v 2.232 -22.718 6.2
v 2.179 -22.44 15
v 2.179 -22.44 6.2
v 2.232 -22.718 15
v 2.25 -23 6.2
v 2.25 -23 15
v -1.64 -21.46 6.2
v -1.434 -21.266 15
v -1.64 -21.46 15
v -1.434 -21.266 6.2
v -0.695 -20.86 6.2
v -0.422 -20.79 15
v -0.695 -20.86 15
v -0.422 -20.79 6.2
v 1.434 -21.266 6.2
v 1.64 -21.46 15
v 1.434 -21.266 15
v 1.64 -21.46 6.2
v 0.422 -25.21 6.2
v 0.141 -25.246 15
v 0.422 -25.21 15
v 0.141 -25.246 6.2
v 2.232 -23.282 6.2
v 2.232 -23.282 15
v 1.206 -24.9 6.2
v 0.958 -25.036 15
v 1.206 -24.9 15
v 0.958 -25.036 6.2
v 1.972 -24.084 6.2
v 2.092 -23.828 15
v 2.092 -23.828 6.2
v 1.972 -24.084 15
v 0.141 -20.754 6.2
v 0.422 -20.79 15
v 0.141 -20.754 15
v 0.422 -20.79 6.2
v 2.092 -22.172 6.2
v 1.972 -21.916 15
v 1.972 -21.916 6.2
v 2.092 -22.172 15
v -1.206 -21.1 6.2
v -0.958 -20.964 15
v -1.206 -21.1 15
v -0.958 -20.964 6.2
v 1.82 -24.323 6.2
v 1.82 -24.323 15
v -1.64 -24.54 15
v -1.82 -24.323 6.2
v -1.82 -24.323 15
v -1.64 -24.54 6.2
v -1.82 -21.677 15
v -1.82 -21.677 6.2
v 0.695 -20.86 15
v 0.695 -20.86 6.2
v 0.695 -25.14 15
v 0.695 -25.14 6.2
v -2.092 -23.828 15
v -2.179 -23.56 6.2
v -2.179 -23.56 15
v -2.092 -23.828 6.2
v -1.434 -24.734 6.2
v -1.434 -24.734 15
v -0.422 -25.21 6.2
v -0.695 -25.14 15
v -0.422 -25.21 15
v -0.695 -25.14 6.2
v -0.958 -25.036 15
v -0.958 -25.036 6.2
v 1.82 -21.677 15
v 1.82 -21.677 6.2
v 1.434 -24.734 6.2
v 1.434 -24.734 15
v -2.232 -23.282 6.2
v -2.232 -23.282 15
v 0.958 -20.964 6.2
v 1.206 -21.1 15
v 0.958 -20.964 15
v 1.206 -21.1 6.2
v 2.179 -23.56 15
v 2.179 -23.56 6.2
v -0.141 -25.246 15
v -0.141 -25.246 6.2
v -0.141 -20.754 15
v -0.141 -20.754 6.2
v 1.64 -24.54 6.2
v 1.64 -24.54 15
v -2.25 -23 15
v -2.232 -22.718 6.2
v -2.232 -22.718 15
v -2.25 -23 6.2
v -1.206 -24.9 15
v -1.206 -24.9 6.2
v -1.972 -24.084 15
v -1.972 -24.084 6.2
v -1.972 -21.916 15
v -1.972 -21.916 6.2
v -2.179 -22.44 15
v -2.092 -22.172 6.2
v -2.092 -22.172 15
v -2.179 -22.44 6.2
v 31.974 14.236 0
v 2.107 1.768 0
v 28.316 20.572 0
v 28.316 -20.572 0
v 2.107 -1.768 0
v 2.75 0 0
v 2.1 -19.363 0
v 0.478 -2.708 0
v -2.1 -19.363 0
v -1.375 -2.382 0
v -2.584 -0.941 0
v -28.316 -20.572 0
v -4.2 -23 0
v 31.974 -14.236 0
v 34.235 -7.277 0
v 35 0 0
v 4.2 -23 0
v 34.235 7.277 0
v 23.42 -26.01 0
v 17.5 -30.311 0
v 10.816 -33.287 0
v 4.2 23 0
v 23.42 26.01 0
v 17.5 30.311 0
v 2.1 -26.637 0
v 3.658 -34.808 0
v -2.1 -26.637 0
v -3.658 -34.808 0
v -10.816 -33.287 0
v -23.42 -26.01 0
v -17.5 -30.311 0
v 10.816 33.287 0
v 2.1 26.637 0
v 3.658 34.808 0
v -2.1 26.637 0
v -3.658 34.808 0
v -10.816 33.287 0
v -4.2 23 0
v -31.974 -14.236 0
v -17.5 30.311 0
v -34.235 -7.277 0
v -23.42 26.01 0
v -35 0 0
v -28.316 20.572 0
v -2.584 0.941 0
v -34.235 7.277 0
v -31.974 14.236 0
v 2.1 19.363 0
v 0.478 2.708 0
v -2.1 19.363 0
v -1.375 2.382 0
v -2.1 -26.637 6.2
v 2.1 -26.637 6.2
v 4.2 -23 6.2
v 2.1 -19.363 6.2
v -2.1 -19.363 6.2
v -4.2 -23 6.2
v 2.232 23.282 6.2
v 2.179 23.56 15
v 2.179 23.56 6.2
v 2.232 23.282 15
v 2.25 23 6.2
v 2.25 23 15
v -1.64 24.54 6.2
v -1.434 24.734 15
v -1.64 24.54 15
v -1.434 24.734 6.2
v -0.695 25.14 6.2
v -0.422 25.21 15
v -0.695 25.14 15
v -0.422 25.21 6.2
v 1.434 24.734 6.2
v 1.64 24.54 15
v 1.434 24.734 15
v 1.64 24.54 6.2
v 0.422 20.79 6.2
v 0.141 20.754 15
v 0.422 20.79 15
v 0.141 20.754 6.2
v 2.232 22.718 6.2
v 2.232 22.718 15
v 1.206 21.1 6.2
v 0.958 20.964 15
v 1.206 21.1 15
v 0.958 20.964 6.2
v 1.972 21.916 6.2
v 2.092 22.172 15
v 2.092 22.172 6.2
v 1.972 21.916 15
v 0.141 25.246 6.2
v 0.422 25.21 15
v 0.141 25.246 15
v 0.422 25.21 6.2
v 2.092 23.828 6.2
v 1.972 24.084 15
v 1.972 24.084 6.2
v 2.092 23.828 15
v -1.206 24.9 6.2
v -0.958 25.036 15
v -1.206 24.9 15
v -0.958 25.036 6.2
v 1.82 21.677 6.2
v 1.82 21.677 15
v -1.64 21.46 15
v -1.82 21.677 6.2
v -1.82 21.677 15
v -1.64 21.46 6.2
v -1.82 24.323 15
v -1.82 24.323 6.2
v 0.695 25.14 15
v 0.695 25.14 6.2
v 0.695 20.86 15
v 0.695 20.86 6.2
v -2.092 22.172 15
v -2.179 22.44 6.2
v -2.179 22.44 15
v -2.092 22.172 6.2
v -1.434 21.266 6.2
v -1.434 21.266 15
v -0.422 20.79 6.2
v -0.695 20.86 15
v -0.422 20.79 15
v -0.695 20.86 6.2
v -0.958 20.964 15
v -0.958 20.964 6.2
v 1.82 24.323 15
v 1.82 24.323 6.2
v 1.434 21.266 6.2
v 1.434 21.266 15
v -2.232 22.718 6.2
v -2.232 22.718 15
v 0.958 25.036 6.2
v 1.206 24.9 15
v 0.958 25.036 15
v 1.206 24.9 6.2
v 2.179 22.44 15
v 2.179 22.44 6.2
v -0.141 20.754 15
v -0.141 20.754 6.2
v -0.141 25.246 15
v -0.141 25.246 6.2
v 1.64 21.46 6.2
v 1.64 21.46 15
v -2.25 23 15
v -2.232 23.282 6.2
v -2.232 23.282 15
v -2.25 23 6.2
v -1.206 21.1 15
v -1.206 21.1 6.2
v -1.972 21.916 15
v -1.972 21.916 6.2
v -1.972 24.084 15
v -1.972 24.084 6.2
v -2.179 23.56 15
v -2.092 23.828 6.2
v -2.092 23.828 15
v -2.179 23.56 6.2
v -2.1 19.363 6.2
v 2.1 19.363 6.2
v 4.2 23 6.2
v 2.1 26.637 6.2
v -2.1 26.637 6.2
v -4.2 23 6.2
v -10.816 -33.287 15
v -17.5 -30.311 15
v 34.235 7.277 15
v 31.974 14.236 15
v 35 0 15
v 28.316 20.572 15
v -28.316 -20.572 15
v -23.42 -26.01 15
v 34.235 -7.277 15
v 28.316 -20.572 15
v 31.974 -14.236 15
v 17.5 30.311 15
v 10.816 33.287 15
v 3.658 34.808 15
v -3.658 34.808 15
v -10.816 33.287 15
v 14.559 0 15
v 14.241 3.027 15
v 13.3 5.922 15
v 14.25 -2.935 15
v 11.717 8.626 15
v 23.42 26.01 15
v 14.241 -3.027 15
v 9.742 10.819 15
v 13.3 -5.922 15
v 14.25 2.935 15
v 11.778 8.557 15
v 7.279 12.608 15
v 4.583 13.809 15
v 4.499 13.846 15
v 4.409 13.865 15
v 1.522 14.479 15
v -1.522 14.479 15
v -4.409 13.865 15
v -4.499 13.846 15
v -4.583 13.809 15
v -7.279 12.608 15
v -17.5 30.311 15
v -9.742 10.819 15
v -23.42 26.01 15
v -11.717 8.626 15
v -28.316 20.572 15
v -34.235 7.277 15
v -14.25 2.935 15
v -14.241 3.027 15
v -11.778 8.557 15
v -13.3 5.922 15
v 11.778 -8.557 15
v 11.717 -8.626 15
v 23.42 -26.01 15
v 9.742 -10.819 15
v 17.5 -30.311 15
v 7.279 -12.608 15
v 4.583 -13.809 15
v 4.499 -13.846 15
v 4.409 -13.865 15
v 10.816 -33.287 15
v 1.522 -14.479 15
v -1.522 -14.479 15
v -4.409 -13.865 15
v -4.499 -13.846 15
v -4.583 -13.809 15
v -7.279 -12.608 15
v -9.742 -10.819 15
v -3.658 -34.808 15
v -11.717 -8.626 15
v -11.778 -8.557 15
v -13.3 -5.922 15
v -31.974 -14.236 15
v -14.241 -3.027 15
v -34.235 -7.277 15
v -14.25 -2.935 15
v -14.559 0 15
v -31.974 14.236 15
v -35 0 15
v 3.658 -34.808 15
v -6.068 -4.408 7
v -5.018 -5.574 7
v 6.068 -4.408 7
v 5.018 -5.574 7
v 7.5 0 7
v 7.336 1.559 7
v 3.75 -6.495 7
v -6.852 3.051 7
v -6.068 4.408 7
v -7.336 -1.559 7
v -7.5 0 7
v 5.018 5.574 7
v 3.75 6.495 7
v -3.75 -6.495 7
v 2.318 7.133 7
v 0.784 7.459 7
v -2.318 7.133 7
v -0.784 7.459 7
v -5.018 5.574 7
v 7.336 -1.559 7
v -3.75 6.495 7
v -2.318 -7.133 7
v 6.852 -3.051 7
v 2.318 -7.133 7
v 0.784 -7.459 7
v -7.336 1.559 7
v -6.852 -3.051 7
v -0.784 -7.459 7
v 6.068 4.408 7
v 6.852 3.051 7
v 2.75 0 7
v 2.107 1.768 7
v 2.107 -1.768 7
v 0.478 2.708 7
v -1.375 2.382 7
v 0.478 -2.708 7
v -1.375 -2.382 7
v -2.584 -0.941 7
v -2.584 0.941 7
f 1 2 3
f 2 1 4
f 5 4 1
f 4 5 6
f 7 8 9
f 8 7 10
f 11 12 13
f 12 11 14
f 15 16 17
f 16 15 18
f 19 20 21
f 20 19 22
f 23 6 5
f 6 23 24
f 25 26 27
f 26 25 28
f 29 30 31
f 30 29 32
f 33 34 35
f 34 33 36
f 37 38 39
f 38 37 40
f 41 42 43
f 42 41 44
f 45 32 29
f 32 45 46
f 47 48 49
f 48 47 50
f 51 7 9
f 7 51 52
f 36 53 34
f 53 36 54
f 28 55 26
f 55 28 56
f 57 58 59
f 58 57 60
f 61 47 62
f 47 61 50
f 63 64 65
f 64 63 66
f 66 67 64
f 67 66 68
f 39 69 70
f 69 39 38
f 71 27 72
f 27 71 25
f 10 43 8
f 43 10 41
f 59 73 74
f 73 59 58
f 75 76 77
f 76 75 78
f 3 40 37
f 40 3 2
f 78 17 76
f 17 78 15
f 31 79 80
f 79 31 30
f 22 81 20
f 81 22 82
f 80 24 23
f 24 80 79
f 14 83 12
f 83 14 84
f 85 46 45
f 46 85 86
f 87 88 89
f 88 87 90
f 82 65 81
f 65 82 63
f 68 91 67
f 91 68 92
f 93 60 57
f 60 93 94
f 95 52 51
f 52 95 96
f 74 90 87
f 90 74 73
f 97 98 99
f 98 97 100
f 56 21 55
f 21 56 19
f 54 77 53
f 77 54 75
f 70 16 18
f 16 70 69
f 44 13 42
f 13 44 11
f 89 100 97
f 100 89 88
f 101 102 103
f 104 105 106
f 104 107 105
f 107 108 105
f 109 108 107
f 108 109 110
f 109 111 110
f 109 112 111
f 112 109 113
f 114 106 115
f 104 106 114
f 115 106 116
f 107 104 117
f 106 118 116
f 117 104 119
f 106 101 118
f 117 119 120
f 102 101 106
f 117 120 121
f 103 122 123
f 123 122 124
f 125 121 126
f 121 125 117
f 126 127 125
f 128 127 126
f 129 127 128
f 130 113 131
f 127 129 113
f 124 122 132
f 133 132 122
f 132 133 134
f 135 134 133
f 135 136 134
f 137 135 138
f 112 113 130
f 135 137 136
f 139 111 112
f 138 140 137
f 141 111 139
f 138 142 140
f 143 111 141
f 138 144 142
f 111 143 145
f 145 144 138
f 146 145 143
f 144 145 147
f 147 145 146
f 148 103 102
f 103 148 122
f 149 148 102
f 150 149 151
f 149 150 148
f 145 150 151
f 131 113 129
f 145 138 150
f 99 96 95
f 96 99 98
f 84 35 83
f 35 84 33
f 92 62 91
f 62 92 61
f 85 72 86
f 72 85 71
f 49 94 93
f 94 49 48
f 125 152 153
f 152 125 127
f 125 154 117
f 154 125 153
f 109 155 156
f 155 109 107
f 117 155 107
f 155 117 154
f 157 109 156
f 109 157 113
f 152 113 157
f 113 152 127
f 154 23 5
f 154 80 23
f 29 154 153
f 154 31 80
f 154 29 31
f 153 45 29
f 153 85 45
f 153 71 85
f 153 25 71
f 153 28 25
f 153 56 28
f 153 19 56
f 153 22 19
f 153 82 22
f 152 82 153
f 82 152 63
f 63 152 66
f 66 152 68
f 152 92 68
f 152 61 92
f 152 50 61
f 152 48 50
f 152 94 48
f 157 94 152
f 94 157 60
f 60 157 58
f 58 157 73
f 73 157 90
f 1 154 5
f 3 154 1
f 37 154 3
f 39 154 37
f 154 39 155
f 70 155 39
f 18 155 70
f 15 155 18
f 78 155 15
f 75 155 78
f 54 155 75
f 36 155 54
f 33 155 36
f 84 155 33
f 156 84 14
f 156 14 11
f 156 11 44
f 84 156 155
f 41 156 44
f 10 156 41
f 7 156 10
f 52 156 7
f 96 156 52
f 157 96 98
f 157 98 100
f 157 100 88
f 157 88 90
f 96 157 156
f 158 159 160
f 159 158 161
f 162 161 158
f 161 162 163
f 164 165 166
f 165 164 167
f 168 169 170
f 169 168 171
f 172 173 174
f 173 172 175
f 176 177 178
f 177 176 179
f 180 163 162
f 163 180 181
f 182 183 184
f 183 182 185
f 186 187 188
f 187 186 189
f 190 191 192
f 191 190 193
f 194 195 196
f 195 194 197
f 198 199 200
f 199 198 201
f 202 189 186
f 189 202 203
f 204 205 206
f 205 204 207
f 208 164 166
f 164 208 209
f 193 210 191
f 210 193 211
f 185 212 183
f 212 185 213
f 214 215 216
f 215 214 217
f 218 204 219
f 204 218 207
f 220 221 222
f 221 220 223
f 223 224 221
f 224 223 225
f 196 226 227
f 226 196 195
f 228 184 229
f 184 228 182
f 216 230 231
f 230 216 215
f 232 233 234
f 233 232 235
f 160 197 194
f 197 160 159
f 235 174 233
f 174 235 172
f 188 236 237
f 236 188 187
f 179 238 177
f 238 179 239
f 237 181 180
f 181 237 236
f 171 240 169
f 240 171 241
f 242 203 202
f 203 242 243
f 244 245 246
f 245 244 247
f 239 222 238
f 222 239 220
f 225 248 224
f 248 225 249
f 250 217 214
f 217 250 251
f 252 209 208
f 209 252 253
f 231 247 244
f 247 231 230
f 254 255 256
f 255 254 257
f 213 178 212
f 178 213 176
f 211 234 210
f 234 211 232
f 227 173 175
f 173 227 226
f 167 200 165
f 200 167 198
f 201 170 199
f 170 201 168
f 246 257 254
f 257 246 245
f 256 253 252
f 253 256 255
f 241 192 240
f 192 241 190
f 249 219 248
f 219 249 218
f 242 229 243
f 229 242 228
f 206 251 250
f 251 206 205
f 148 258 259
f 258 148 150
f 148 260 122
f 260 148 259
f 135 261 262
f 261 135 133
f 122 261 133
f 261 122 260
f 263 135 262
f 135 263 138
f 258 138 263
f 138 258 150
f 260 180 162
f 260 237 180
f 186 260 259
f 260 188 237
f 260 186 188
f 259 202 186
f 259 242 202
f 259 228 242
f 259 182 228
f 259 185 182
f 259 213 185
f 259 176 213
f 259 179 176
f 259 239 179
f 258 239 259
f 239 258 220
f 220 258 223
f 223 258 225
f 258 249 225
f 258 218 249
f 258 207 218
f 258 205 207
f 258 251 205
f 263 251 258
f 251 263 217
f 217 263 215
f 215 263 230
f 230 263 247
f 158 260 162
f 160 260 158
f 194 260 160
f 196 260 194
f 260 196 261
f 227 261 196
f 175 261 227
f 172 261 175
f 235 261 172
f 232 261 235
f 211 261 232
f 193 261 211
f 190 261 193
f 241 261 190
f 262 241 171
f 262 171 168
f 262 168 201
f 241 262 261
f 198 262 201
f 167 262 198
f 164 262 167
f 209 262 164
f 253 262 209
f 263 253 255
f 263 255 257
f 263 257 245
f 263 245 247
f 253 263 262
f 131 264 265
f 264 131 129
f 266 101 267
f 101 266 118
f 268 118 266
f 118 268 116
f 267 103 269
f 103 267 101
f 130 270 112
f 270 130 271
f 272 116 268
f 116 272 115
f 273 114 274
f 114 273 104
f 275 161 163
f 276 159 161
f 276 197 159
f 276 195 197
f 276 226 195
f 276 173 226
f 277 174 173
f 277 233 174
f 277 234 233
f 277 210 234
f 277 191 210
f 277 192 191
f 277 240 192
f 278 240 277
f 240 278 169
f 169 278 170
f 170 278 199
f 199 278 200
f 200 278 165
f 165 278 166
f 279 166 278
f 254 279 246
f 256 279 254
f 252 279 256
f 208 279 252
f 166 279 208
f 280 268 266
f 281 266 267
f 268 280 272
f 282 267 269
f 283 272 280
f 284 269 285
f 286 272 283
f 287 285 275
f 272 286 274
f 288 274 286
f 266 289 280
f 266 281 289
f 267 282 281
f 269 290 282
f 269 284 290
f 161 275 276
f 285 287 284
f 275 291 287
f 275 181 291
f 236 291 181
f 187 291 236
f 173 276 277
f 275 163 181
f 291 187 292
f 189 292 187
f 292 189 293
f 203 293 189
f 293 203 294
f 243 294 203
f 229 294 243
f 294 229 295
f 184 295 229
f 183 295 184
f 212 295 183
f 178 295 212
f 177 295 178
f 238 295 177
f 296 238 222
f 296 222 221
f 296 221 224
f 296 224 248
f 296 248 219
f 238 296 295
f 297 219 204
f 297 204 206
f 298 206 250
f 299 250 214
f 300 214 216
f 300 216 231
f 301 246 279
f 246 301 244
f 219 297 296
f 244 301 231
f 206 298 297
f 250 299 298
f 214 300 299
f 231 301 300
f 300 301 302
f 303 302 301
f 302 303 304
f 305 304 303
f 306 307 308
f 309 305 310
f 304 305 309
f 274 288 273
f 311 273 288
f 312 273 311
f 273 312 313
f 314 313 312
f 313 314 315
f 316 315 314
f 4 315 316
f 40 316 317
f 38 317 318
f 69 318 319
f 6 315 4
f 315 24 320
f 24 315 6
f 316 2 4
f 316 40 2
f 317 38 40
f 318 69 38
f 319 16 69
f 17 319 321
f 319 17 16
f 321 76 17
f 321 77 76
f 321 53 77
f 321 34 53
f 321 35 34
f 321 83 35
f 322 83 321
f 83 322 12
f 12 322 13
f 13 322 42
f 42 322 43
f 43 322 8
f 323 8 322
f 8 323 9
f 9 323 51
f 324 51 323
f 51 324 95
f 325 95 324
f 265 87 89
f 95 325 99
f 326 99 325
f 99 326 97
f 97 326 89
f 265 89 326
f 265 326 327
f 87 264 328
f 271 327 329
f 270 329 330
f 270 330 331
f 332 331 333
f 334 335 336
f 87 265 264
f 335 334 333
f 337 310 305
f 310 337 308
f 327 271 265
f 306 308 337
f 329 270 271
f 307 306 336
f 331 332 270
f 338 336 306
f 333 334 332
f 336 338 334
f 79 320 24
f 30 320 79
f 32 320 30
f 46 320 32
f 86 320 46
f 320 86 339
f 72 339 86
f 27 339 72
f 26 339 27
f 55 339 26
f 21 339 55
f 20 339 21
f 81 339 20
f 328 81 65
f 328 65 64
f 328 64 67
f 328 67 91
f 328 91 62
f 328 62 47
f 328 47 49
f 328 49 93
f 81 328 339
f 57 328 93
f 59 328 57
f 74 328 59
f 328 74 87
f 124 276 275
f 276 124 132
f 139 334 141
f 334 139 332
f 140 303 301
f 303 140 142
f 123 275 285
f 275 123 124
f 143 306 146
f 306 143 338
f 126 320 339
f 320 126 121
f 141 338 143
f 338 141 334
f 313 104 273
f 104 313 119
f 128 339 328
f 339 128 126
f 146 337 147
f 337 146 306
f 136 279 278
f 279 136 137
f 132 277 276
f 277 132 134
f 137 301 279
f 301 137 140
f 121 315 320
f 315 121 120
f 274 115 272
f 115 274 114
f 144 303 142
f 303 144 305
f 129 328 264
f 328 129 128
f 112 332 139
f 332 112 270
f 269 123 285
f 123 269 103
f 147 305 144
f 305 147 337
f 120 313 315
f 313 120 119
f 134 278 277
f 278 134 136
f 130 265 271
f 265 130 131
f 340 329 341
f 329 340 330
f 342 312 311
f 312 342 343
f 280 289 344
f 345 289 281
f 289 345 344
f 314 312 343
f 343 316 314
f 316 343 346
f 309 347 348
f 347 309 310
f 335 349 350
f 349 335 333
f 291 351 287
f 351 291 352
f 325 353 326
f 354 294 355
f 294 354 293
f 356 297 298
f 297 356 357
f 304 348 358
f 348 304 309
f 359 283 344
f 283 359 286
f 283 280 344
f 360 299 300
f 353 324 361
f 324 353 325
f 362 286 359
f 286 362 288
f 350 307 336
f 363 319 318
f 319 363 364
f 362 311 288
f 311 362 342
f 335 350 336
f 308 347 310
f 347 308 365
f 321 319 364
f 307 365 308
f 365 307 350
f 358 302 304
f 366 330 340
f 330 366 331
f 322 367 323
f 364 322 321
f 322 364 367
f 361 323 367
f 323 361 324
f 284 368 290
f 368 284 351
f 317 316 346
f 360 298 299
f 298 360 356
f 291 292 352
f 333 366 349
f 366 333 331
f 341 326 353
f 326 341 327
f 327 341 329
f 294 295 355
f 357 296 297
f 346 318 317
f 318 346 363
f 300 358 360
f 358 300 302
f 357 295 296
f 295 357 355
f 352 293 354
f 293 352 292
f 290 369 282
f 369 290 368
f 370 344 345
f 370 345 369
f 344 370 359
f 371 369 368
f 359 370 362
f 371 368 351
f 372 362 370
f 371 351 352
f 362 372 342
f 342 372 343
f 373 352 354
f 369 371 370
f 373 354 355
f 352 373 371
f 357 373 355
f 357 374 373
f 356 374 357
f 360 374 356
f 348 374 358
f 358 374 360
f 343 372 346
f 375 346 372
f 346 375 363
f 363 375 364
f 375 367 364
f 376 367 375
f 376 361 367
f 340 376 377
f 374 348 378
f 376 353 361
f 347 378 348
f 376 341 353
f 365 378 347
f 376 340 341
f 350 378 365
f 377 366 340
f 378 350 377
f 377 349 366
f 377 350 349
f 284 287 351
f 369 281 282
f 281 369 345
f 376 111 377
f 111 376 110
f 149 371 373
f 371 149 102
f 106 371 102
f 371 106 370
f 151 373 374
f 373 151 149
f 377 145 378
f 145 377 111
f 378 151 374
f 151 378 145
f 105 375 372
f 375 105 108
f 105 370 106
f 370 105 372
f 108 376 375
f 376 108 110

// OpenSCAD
include <../Parameters.scad>


module 888_3010(draft = true){
    translate([0, 0, 0]) difference(){
       cylinder(d=70, h=15);
    
        translate([0, -46/2, 0]){
            cylinder(d= M4_screw_diameter, h=20, $fn=draft?50:100);
            cylinder(d= M4_nut_diameter, h=M4_nut_height+3, $fn=6);
        }
        translate([0,  46/2, 0]){
            cylinder(d= M4_screw_diameter, h=20, $fn=draft?50:100);
            cylinder(d= M4_nut_diameter, h=M4_nut_height+3, $fn=6);
        }

        translate([0,0,7]){
        	cylinder(h=15-6.5, d1=15, d2=30);
        }
        //translate([0,0,4]){
        //	cylinder(h=20, d=M5_nut_diameter, $fn=6);
        //}
        translate([0,0,-0.1]){
        	cylinder(d=M5_screw_diameter, h=30);
        }
    }
}
888_3010();
